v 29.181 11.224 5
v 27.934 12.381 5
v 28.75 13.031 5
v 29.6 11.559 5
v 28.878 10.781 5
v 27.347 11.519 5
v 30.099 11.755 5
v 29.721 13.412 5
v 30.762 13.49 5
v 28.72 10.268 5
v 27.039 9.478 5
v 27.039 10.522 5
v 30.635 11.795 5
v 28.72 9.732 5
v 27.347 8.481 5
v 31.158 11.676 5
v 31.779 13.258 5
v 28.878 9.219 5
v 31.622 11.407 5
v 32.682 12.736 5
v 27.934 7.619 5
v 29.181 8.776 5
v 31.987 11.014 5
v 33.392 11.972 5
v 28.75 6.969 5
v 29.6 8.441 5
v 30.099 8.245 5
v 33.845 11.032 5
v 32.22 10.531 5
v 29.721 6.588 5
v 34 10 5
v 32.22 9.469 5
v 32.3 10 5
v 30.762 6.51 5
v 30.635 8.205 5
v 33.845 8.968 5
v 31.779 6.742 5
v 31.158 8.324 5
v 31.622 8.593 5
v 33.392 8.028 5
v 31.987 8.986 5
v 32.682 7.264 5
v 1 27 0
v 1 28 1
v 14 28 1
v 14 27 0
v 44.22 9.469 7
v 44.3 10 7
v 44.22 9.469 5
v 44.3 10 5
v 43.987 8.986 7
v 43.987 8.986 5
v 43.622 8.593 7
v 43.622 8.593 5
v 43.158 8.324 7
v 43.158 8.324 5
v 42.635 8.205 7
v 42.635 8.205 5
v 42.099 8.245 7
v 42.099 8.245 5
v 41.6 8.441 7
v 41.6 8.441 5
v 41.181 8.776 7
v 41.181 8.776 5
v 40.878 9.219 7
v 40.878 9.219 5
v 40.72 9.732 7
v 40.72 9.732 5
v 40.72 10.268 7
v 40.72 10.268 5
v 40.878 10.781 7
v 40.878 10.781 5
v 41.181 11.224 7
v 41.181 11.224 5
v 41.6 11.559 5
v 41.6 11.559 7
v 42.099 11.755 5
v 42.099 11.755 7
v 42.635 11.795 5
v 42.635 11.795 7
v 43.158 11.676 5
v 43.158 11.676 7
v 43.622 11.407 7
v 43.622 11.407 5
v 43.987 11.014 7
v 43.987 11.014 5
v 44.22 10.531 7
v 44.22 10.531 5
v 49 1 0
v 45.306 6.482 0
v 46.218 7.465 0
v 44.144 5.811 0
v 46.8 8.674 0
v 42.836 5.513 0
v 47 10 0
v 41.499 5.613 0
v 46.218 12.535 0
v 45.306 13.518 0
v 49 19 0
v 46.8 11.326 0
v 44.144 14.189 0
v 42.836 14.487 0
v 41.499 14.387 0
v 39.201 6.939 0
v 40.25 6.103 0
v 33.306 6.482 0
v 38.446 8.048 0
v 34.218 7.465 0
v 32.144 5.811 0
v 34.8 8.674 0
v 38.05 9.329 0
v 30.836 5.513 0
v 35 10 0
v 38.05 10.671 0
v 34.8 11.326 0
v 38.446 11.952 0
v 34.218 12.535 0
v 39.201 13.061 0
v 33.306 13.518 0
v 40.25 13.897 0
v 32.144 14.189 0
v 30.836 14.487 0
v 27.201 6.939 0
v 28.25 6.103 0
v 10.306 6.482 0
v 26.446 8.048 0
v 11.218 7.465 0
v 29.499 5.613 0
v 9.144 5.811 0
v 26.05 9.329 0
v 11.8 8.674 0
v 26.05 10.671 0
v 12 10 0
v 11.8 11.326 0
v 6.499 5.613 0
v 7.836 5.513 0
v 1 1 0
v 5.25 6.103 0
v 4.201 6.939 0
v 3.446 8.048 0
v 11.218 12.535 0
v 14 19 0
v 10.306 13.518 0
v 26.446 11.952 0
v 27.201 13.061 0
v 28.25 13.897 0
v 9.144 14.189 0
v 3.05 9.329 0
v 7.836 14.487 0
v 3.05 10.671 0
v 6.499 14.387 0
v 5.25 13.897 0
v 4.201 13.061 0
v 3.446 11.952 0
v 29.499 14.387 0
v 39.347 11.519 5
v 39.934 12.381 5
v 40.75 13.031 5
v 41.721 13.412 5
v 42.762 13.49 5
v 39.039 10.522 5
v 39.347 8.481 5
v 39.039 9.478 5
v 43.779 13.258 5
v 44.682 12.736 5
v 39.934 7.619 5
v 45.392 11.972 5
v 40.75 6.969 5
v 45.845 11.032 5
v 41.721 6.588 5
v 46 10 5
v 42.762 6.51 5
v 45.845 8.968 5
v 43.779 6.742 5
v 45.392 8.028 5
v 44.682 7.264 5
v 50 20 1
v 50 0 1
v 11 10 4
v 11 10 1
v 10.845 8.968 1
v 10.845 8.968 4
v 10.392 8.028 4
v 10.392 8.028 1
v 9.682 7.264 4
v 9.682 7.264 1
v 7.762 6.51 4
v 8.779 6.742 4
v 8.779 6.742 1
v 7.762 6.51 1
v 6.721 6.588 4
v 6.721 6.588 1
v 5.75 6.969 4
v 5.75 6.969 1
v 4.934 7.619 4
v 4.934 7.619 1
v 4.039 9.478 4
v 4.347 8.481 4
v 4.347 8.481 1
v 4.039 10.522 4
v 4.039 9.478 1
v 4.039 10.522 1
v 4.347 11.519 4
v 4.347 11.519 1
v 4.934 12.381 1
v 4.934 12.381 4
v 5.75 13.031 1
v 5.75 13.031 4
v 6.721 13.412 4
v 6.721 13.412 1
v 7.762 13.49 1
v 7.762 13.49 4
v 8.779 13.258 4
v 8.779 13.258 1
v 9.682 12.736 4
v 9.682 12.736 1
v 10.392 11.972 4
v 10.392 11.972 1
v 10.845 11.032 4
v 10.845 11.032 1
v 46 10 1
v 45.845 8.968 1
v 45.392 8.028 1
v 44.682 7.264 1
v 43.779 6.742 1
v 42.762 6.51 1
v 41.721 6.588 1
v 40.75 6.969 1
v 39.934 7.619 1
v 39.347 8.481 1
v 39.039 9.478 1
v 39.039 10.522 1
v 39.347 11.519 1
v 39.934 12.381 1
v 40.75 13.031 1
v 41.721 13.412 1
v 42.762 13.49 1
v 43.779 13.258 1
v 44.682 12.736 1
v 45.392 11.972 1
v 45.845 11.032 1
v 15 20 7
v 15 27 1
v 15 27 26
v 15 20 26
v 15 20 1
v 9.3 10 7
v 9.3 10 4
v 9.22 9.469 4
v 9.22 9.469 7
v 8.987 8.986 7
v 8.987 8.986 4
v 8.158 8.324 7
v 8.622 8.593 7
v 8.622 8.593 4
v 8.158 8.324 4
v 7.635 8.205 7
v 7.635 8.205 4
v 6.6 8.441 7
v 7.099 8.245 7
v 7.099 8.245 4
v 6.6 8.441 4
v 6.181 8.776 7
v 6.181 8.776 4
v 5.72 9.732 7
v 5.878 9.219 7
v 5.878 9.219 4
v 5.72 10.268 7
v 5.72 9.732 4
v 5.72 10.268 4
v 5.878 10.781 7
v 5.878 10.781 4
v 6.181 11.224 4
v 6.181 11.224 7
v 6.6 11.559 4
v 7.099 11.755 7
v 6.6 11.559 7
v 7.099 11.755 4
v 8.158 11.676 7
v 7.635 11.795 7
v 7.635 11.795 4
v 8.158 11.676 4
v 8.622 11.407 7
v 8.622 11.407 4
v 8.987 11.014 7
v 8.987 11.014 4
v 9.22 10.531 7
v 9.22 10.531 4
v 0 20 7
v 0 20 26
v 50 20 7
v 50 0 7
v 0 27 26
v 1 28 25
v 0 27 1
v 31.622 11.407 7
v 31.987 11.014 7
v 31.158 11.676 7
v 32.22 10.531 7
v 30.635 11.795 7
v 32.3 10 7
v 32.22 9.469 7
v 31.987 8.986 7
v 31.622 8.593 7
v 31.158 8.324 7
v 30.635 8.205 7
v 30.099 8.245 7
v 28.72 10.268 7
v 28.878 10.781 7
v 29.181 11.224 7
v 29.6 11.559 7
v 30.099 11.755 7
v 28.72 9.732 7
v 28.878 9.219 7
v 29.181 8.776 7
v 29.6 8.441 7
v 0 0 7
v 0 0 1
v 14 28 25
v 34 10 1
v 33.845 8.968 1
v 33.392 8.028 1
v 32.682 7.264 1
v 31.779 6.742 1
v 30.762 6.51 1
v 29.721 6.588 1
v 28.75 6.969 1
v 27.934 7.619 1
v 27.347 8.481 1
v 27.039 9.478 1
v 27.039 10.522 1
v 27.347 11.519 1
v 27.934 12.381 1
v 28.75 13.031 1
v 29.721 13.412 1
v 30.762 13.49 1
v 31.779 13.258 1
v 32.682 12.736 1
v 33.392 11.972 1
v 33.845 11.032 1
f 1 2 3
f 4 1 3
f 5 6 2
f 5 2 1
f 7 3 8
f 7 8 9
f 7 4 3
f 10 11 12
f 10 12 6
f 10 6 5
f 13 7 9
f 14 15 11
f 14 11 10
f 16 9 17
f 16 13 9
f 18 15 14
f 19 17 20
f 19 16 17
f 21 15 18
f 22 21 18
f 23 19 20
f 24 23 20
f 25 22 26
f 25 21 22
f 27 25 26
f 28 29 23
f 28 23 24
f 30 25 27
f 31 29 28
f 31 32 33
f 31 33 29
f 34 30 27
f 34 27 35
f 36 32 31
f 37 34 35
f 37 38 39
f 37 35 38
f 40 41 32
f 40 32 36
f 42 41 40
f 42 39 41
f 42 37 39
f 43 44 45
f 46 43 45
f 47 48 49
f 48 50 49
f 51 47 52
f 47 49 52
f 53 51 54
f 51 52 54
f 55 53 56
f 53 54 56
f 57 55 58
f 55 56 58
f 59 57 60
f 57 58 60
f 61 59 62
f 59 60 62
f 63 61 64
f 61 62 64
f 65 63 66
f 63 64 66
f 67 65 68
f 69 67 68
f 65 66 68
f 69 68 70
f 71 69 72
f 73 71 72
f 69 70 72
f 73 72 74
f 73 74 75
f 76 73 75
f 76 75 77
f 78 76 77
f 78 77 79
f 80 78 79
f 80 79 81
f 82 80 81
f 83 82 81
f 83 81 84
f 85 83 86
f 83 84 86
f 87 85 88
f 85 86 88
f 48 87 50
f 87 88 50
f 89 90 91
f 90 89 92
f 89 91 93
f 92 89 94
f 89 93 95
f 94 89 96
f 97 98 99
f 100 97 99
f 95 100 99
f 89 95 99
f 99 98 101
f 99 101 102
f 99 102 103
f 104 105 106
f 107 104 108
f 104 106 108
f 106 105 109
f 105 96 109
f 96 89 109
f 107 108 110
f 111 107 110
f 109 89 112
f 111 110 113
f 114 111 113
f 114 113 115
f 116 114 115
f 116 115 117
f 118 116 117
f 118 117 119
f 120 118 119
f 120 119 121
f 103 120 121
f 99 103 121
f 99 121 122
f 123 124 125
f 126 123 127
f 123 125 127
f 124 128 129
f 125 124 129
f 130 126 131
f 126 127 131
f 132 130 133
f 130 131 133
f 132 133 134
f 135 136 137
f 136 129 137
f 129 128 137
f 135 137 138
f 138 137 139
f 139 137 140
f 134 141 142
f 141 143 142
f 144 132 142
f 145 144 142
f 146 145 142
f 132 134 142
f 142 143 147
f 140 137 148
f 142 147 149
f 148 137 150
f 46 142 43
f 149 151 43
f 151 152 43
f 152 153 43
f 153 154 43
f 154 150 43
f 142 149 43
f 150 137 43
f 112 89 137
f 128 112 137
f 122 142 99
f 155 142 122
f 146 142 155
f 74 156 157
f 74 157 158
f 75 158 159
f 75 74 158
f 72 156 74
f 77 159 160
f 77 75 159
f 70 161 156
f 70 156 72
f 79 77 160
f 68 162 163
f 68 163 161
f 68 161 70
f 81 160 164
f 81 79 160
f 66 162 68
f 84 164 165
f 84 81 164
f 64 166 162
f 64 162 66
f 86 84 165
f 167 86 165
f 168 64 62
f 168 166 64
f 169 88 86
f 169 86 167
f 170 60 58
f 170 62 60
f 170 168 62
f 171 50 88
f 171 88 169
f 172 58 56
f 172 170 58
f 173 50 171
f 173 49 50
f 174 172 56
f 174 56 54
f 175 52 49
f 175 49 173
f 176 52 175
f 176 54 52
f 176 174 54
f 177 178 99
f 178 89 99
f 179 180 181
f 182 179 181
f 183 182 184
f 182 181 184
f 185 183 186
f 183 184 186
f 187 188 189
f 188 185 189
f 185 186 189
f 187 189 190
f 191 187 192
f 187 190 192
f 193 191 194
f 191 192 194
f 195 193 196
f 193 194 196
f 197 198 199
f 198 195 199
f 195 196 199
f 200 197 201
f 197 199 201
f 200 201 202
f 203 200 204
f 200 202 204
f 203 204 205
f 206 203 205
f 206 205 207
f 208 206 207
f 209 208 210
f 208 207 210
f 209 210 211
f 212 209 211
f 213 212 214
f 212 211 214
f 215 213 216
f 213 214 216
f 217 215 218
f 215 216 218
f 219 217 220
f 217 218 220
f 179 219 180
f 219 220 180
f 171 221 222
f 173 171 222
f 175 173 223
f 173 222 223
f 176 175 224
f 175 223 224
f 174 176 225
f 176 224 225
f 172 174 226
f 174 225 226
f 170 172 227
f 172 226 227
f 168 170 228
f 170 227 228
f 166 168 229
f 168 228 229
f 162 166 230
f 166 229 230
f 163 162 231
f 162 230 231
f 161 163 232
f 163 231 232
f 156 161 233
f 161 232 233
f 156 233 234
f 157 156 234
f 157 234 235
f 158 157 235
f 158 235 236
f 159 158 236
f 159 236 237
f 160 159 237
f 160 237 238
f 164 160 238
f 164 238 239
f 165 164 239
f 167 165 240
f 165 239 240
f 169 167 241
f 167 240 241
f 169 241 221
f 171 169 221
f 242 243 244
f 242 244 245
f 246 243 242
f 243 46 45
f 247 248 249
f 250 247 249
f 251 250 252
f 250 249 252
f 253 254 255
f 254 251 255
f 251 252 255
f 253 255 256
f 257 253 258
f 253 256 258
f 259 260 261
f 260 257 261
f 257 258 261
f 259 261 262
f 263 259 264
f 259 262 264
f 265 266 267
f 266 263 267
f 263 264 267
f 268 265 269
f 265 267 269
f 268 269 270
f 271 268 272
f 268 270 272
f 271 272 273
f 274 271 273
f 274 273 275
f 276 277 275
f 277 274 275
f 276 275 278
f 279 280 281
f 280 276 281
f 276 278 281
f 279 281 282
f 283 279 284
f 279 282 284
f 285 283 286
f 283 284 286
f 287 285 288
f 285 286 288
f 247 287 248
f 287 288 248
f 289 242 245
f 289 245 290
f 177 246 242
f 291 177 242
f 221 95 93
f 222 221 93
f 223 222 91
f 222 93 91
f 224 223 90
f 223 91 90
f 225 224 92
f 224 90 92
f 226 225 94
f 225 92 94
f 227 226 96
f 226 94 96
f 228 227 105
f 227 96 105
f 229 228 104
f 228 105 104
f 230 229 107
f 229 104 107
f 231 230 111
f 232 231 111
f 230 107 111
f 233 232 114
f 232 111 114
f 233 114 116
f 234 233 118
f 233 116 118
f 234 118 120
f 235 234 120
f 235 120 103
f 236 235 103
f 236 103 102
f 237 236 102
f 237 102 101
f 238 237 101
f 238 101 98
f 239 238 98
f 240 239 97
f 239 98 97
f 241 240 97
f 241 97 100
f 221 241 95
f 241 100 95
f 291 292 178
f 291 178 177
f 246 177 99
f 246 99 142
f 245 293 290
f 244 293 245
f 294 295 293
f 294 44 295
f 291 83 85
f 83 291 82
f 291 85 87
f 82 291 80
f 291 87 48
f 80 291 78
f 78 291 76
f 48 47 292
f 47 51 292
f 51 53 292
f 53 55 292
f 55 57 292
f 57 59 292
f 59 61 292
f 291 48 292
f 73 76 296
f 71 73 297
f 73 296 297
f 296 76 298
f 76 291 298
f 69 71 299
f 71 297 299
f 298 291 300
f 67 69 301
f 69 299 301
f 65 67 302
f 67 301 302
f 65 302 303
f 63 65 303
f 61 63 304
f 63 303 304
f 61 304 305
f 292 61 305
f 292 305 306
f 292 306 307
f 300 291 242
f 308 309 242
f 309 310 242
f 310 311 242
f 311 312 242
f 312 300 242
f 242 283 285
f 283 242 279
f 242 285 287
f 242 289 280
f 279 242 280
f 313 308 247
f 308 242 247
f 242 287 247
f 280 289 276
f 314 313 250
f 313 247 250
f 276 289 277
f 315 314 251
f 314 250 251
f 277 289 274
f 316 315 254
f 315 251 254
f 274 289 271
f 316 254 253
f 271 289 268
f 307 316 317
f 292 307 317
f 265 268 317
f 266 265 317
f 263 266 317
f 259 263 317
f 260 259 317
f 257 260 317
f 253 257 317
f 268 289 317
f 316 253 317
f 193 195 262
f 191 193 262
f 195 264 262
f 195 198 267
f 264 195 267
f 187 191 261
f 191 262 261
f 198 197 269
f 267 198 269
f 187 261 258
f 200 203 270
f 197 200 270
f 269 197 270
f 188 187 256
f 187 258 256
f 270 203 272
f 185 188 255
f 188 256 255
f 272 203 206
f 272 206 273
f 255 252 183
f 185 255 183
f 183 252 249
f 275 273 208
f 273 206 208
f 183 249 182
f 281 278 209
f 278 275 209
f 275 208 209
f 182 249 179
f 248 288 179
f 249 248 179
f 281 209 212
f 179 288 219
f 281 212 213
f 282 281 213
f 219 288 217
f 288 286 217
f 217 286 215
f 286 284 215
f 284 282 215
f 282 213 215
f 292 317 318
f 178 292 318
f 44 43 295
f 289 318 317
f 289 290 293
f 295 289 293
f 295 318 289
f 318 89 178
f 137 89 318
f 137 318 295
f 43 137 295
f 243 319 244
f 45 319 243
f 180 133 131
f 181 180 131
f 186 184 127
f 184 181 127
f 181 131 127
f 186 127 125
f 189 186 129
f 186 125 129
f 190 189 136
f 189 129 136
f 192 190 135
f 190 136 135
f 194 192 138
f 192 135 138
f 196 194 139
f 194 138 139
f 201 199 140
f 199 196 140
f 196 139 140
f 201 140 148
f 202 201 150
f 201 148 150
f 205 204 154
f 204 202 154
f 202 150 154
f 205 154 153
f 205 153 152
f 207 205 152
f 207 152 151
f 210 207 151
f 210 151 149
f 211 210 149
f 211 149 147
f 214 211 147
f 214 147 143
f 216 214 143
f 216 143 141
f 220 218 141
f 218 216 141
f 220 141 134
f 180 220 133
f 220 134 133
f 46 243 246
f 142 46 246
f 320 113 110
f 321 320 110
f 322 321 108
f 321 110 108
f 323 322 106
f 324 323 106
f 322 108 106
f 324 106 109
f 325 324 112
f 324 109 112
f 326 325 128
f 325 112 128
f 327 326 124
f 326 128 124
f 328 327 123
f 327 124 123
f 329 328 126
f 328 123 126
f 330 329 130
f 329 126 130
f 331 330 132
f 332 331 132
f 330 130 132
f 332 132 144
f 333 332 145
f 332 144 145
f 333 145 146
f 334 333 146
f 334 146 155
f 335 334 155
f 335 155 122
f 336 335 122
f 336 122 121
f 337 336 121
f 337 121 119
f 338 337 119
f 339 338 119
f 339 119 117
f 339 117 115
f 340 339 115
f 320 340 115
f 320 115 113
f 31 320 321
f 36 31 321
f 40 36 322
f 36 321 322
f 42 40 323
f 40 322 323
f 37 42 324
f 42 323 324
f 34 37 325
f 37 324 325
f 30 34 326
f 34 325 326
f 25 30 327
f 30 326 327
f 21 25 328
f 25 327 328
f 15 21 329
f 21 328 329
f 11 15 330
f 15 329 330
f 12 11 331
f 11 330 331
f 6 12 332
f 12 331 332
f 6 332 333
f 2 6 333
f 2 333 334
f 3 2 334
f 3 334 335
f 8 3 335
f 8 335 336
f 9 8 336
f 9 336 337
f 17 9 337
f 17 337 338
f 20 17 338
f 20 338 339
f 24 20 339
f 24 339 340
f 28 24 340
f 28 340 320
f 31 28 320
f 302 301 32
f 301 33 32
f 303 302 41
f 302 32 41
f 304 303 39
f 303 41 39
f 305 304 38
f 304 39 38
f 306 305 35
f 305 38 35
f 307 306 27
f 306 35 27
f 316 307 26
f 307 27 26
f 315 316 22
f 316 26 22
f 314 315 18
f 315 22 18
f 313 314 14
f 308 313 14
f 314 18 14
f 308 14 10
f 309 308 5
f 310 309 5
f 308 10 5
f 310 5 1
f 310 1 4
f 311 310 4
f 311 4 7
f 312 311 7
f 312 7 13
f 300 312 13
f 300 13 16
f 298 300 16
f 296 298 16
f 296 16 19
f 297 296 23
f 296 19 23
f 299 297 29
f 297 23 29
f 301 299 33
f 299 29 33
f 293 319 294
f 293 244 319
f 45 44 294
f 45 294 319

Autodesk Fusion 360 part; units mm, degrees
sketch "Sketch1" plane through (0, 0, 0) normal (0, 0, 1) x (1, 0, 0)
  circle A0 centre (7.5, 10) radius 1.8
  line L0 (0, 0) -> (15, 0)
  line L1 (15, 0) -> (15, 20)
  line L2 (15, 20) -> (0, 20)
  line L3 (0, 20) -> (0, 0)
  circle A1 centre (7.5, 10) radius 3.5
  line L4 (15, 20) -> (0, 20)
  line L5 (0, 20) -> (0, 28)
  line L6 (0, 28) -> (15, 28)
  line L7 (15, 28) -> (15, 20)
  dimension "d3" = 3.6
  dimension "d17" = 15
  dimension "d18" = 20
  dimension "d19" = 10
  dimension "d21" = 7
  dimension "d26" = 15
  dimension "d27" = 8
extrude "Extrude1" add sketch "Sketch1" along normal blind 7 contours L0 L1 L2 L3 L4 | A1
sketch "Sketch4" plane through (15, 0, 0) normal (1, 0, 0) x (0, 1, 0)
  line L0 (0, 0) -> (20, 0)
  line L1 (20, 0) -> (20, 7)
  line L2 (20, 7) -> (0, 7)
  line L3 (0, 7) -> (0, 0)
extrude "Extrude4" cut sketch "Sketch1" along normal blind 4 contours A1
extrude "Extrude5" add sketch "Sketch1" along normal blind 26 contours L2 L4 L5 L6 L7
extrude "Extrude6" add sketch "Sketch4" along normal blind 35
sketch "Sketch5" plane through (0, 0, 0) normal (0, 0, -1) x (1, 0, 0)
  circle A0 centre (7.5, -10) radius 3.5
  line L0 (50, 0) -> (0, 0)
  line L1 (0, 0) -> (0, -28)
  line L2 (0, -28) -> (15, -28)
  line L3 (15, -28) -> (15, -20)
  line L4 (15, -20) -> (50, -20)
  line L5 (50, -20) -> (50, 0)
  circle A1 centre (42.5, -10) radius 1.8
  circle A2 centre (42.5, -10) radius 3.5
  circle A3 centre (30.5, -10) radius 1.8
  circle A4 centre (30.5, -10) radius 3.5
  point P0 (7.5, -10)
  dimension "d33" = 3.6
  dimension "d34" = 7
  dimension "d35" = 7.5
  dimension "d40" = 3.6
  dimension "d41" = 7
  dimension "d42" = 12
extrude "Extrude8" cut sketch "Sketch5" against normal through all contours A1 | A3
extrude "Extrude7" cut sketch "Sketch5" against normal blind 5 contours A1 | A2 | A4
chamfer "Chamfer2" distance 1 angle 45 2 faces at (7.4128, 20.4967, 0) (5, 28, 8.6667)
equation "d7 = 7 mm"
equation "d19 = d18 / 2"
equation "d33 = d3"
equation "d34 = d21"
equation "d36 = -d7 + 2 mm"
equation "d40 = d3"
equation "d41 = d21"
